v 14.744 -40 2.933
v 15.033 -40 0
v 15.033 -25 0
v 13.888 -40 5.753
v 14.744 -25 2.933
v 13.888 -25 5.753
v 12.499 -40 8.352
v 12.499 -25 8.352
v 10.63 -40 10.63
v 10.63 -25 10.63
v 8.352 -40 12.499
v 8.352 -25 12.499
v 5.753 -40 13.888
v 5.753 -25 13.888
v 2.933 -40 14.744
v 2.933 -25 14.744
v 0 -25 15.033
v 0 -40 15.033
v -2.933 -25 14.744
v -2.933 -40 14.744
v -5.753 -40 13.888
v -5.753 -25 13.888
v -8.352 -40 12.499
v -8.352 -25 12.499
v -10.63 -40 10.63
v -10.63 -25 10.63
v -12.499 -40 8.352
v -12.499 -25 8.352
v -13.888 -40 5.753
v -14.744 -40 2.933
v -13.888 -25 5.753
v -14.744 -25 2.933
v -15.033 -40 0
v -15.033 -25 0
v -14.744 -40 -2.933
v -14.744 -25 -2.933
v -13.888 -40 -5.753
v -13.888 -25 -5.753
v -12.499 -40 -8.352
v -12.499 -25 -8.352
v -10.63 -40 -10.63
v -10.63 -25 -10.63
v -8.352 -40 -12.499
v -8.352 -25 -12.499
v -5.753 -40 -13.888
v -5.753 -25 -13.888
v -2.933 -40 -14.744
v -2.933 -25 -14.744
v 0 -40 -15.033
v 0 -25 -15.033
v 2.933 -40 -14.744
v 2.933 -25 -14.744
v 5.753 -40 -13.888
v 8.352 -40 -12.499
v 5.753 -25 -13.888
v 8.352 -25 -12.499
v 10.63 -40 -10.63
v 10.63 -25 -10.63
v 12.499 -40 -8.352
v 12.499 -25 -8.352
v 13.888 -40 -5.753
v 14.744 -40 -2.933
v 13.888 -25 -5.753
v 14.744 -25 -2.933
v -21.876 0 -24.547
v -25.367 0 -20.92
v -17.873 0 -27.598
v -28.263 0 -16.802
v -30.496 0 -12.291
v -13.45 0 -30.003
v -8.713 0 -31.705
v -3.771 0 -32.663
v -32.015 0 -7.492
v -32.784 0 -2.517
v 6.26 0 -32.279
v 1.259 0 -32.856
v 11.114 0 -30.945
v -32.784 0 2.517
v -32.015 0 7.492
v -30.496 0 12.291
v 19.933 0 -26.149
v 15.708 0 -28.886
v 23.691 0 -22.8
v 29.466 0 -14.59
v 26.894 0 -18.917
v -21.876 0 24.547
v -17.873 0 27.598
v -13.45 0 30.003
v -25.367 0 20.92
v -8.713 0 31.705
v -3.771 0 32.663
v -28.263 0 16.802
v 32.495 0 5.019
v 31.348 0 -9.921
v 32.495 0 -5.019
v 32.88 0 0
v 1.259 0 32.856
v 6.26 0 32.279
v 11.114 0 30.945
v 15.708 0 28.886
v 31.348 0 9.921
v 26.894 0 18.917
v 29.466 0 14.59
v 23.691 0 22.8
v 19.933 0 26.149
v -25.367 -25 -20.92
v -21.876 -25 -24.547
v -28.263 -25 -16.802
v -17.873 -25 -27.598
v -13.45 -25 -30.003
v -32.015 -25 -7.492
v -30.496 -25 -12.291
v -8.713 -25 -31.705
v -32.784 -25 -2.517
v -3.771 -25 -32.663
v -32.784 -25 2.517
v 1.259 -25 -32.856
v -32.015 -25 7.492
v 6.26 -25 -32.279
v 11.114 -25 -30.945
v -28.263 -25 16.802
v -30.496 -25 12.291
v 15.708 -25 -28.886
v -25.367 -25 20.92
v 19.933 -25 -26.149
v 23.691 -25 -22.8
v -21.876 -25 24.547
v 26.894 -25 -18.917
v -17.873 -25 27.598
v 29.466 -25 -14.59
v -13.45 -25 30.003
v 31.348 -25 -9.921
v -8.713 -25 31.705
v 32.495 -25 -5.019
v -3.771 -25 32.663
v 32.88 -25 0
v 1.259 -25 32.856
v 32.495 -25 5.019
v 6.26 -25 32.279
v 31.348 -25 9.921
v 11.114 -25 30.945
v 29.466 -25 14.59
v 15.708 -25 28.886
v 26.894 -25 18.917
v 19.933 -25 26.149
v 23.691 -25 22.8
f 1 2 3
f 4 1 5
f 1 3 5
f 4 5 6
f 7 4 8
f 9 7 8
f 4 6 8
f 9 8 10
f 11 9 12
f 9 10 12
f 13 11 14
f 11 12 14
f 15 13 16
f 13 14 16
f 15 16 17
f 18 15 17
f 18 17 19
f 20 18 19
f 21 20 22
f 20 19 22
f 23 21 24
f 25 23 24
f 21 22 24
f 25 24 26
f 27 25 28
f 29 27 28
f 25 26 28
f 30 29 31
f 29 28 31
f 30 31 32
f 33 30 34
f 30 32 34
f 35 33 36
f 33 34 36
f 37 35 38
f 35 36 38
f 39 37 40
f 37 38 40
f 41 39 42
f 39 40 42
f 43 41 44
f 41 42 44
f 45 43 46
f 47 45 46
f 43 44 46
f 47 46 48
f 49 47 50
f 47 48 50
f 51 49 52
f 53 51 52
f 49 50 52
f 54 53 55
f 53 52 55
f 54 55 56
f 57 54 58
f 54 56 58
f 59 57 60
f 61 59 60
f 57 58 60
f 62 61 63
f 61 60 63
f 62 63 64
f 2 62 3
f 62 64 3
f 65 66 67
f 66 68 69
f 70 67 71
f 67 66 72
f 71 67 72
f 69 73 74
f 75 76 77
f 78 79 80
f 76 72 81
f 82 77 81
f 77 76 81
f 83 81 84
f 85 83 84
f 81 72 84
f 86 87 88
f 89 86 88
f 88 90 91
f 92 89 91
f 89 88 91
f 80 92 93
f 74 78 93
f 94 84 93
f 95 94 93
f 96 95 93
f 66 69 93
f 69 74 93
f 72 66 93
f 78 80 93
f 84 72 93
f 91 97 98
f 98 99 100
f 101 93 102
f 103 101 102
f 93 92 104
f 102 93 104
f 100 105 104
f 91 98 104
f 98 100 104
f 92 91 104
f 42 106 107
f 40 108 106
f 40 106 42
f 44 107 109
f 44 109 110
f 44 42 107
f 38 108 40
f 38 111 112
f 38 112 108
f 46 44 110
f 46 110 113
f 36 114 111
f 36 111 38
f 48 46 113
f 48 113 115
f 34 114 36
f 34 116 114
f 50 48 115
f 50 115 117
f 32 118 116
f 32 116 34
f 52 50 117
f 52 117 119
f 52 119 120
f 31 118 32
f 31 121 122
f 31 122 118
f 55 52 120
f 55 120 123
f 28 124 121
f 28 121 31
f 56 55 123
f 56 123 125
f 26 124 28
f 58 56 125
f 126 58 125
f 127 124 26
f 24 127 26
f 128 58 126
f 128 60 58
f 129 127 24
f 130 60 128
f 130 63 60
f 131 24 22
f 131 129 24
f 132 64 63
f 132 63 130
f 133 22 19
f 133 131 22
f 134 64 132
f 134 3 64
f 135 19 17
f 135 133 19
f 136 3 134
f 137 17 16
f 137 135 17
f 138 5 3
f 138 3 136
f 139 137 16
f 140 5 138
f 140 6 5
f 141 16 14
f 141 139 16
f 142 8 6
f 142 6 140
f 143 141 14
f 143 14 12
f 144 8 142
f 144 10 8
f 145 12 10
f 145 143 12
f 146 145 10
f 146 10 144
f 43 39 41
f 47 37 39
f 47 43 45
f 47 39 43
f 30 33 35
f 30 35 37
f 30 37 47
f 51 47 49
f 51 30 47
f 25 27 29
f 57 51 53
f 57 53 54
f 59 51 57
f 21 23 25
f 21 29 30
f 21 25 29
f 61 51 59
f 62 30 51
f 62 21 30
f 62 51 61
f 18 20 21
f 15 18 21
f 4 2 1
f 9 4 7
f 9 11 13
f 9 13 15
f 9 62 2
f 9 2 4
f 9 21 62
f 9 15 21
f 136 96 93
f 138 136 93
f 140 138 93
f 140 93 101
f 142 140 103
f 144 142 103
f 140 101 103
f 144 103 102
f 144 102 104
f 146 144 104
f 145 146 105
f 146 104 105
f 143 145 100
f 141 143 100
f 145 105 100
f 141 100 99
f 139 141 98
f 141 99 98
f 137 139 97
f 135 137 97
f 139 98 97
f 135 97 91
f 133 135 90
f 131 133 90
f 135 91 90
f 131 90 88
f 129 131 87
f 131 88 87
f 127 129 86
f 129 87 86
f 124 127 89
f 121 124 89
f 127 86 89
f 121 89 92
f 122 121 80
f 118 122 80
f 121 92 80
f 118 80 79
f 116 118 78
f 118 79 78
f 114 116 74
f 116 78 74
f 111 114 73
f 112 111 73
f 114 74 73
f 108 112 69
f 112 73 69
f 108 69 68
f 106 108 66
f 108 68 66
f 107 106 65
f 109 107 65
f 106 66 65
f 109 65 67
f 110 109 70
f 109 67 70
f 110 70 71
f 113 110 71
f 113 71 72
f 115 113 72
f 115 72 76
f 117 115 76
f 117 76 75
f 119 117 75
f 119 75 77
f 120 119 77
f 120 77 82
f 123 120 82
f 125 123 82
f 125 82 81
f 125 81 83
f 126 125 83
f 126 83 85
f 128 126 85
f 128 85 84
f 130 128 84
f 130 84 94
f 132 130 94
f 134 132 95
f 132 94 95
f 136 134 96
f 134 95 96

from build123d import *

# Parameters (mm, degrees)
F0_R     = 32.880177
F2_DEPTH = 25
F1_R     = 23.131498
F3_DEPTH = 15
F4_R     = 15.032714
F5_DEPTH = 15


with BuildPart() as f2:
    # F0 (on Front) → F2 (new body)
    with BuildSketch(Plane.XZ):
        Circle(F0_R)
    extrude(amount=F2_DEPTH)

    # F1 (on Front) → F3 (join)
    with BuildSketch(Plane.XZ):
        Circle(F1_R)
    extrude(amount=F3_DEPTH)

    # F4 (on face) → F5 (join)
    with BuildSketch(Plane.XZ.offset(25)):
        Circle(F4_R)
    extrude(amount=F5_DEPTH)


solid = f2.part
